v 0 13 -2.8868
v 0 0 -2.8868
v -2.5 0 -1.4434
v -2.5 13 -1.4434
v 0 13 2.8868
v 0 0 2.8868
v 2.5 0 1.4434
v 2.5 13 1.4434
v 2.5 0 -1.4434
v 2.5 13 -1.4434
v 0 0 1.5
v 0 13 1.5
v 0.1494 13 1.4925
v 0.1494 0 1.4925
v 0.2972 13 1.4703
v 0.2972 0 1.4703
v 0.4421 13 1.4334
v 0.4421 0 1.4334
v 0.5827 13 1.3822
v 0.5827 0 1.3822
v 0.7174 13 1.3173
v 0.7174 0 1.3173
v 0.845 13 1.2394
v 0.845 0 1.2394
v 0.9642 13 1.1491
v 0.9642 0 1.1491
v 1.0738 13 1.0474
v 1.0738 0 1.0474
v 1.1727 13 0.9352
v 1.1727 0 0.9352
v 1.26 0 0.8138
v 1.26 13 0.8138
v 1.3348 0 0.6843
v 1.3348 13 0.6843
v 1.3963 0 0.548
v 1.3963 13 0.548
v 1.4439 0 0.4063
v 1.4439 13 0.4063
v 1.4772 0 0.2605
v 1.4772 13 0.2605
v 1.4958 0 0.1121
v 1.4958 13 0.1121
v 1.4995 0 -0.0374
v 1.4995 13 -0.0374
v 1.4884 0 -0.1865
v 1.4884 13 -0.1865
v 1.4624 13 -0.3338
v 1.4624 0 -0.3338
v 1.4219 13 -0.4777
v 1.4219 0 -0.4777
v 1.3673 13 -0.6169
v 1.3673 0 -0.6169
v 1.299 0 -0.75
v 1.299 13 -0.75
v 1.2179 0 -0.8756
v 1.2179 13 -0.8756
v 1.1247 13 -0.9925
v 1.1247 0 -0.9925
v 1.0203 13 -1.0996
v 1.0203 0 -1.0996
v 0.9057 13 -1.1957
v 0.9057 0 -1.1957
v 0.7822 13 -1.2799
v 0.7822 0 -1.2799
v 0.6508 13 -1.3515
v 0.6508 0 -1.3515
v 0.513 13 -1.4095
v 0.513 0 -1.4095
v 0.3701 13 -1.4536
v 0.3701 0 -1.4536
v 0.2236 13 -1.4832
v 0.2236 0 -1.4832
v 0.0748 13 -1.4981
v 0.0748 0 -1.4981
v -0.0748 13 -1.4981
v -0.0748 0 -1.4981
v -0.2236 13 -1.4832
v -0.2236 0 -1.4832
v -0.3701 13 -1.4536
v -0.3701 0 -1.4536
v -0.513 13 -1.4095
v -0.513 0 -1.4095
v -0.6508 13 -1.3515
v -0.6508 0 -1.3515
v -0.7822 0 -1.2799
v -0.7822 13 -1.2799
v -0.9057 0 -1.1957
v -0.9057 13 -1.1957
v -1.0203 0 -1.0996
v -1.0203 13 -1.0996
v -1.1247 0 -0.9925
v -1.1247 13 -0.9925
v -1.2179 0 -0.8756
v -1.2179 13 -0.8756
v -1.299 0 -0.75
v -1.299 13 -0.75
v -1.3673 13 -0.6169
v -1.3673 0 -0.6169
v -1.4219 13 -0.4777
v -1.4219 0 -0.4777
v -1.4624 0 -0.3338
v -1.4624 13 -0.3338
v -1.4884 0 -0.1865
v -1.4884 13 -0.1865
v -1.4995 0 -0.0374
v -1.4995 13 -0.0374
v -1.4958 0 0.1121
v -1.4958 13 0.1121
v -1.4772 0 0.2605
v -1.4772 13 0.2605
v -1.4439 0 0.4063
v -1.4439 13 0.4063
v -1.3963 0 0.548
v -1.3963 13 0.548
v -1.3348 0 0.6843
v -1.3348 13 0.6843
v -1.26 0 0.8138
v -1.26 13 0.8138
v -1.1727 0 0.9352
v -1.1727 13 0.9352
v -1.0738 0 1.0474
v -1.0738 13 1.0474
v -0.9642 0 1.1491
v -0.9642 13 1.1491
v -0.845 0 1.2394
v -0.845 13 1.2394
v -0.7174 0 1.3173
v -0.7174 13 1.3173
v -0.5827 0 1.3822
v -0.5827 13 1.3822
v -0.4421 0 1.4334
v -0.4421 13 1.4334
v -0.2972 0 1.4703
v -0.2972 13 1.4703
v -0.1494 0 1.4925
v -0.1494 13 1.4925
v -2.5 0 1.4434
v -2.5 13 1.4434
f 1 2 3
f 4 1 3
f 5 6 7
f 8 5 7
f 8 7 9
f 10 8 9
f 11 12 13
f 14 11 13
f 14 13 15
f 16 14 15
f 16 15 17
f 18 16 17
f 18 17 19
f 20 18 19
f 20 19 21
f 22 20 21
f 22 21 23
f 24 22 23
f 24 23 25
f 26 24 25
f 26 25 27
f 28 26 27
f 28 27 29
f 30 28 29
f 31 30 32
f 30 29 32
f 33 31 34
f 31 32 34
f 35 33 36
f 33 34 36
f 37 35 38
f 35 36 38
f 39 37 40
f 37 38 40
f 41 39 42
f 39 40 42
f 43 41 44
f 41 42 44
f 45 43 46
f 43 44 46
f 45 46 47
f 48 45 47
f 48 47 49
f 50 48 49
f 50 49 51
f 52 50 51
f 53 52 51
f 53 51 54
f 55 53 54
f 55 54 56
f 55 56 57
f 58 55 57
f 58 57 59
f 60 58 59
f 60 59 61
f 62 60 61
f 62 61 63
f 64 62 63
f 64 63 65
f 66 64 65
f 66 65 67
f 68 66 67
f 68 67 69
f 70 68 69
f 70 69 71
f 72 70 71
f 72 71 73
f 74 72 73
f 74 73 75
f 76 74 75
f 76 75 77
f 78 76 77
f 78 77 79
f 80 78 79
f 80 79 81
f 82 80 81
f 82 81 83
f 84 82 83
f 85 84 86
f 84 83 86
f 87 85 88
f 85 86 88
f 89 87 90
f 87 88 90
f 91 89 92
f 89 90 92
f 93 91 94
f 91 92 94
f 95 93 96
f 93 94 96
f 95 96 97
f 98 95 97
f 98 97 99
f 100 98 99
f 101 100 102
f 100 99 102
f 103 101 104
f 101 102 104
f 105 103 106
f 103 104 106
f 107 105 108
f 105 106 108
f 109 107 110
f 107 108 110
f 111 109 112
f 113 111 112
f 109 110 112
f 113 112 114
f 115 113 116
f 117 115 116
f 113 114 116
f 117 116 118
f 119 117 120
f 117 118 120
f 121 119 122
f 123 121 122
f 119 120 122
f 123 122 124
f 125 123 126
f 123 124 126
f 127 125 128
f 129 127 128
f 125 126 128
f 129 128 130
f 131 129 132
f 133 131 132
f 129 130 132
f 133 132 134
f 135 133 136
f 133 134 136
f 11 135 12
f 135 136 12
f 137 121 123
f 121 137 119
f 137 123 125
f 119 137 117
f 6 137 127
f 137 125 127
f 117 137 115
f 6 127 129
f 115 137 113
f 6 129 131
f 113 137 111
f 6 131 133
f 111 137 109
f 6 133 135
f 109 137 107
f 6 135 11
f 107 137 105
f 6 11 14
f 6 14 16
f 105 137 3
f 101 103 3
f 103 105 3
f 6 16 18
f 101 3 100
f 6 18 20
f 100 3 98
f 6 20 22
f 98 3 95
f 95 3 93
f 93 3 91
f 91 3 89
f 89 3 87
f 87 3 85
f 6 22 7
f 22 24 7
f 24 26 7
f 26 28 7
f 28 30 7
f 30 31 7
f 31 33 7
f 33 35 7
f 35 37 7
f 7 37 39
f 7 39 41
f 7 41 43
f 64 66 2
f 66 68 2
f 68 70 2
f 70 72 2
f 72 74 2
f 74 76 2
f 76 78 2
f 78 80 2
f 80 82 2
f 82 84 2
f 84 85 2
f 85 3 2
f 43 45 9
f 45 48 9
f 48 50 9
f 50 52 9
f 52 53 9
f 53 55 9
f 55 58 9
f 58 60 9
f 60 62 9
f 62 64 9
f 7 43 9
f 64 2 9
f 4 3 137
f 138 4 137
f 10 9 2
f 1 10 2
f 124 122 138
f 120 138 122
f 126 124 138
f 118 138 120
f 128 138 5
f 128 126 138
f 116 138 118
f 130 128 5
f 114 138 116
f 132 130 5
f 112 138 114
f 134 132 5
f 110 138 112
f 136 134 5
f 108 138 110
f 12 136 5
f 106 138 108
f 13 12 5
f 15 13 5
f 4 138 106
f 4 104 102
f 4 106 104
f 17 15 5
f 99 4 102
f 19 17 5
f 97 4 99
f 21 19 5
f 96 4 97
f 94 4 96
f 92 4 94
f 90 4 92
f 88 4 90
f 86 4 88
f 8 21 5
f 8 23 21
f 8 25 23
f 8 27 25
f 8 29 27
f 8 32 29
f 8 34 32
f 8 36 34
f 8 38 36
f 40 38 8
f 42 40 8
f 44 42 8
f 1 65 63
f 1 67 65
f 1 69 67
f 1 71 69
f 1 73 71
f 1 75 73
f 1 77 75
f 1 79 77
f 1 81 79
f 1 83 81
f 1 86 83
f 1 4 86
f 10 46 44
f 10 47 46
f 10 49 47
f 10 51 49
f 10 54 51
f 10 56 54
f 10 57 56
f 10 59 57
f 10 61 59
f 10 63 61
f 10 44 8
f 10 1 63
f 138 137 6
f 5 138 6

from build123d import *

# Parameters (mm, degrees)
EXTRUDE_1_DEPTH     = 13
CUT_EXTRUDE_1_REACH = 15.549
SKETCH_2_R          = 1.5


with BuildPart() as part:
    # 草圖1 → 填料-伸長1 (new body)
    with BuildSketch(Plane(origin=(0, 0, 0), x_dir=(1, 0, 0), z_dir=(0, 1, 0))):
        Polygon((0, 2.886751346), (-2.5, 1.443375673), (-2.5, -1.443375673), (0, -2.886751346), (2.5, -1.443375673), (2.5, 1.443375673), align=None)
    extrude(amount=EXTRUDE_1_DEPTH)

    # 草圖2 → 除料-伸長1 (cut, up to next)
    with BuildSketch(Plane(origin=(0, 13, 0), x_dir=(-1, 0, 0), z_dir=(0, 1, 0)), mode=Mode.PRIVATE) as cut_extrude_1_sk1:
        with Locations(Location((0, 0, 0), (0, 0, 90))):
            Circle(SKETCH_2_R)
    cut_extrude_1_tool1 = extrude(cut_extrude_1_sk1.sketch, amount=-CUT_EXTRUDE_1_REACH, mode=Mode.PRIVATE) & part.part
    add(cut_extrude_1_tool1.solids().sort_by_distance((0, 13, 0))[0], mode=Mode.SUBTRACT)


solid = part.part
